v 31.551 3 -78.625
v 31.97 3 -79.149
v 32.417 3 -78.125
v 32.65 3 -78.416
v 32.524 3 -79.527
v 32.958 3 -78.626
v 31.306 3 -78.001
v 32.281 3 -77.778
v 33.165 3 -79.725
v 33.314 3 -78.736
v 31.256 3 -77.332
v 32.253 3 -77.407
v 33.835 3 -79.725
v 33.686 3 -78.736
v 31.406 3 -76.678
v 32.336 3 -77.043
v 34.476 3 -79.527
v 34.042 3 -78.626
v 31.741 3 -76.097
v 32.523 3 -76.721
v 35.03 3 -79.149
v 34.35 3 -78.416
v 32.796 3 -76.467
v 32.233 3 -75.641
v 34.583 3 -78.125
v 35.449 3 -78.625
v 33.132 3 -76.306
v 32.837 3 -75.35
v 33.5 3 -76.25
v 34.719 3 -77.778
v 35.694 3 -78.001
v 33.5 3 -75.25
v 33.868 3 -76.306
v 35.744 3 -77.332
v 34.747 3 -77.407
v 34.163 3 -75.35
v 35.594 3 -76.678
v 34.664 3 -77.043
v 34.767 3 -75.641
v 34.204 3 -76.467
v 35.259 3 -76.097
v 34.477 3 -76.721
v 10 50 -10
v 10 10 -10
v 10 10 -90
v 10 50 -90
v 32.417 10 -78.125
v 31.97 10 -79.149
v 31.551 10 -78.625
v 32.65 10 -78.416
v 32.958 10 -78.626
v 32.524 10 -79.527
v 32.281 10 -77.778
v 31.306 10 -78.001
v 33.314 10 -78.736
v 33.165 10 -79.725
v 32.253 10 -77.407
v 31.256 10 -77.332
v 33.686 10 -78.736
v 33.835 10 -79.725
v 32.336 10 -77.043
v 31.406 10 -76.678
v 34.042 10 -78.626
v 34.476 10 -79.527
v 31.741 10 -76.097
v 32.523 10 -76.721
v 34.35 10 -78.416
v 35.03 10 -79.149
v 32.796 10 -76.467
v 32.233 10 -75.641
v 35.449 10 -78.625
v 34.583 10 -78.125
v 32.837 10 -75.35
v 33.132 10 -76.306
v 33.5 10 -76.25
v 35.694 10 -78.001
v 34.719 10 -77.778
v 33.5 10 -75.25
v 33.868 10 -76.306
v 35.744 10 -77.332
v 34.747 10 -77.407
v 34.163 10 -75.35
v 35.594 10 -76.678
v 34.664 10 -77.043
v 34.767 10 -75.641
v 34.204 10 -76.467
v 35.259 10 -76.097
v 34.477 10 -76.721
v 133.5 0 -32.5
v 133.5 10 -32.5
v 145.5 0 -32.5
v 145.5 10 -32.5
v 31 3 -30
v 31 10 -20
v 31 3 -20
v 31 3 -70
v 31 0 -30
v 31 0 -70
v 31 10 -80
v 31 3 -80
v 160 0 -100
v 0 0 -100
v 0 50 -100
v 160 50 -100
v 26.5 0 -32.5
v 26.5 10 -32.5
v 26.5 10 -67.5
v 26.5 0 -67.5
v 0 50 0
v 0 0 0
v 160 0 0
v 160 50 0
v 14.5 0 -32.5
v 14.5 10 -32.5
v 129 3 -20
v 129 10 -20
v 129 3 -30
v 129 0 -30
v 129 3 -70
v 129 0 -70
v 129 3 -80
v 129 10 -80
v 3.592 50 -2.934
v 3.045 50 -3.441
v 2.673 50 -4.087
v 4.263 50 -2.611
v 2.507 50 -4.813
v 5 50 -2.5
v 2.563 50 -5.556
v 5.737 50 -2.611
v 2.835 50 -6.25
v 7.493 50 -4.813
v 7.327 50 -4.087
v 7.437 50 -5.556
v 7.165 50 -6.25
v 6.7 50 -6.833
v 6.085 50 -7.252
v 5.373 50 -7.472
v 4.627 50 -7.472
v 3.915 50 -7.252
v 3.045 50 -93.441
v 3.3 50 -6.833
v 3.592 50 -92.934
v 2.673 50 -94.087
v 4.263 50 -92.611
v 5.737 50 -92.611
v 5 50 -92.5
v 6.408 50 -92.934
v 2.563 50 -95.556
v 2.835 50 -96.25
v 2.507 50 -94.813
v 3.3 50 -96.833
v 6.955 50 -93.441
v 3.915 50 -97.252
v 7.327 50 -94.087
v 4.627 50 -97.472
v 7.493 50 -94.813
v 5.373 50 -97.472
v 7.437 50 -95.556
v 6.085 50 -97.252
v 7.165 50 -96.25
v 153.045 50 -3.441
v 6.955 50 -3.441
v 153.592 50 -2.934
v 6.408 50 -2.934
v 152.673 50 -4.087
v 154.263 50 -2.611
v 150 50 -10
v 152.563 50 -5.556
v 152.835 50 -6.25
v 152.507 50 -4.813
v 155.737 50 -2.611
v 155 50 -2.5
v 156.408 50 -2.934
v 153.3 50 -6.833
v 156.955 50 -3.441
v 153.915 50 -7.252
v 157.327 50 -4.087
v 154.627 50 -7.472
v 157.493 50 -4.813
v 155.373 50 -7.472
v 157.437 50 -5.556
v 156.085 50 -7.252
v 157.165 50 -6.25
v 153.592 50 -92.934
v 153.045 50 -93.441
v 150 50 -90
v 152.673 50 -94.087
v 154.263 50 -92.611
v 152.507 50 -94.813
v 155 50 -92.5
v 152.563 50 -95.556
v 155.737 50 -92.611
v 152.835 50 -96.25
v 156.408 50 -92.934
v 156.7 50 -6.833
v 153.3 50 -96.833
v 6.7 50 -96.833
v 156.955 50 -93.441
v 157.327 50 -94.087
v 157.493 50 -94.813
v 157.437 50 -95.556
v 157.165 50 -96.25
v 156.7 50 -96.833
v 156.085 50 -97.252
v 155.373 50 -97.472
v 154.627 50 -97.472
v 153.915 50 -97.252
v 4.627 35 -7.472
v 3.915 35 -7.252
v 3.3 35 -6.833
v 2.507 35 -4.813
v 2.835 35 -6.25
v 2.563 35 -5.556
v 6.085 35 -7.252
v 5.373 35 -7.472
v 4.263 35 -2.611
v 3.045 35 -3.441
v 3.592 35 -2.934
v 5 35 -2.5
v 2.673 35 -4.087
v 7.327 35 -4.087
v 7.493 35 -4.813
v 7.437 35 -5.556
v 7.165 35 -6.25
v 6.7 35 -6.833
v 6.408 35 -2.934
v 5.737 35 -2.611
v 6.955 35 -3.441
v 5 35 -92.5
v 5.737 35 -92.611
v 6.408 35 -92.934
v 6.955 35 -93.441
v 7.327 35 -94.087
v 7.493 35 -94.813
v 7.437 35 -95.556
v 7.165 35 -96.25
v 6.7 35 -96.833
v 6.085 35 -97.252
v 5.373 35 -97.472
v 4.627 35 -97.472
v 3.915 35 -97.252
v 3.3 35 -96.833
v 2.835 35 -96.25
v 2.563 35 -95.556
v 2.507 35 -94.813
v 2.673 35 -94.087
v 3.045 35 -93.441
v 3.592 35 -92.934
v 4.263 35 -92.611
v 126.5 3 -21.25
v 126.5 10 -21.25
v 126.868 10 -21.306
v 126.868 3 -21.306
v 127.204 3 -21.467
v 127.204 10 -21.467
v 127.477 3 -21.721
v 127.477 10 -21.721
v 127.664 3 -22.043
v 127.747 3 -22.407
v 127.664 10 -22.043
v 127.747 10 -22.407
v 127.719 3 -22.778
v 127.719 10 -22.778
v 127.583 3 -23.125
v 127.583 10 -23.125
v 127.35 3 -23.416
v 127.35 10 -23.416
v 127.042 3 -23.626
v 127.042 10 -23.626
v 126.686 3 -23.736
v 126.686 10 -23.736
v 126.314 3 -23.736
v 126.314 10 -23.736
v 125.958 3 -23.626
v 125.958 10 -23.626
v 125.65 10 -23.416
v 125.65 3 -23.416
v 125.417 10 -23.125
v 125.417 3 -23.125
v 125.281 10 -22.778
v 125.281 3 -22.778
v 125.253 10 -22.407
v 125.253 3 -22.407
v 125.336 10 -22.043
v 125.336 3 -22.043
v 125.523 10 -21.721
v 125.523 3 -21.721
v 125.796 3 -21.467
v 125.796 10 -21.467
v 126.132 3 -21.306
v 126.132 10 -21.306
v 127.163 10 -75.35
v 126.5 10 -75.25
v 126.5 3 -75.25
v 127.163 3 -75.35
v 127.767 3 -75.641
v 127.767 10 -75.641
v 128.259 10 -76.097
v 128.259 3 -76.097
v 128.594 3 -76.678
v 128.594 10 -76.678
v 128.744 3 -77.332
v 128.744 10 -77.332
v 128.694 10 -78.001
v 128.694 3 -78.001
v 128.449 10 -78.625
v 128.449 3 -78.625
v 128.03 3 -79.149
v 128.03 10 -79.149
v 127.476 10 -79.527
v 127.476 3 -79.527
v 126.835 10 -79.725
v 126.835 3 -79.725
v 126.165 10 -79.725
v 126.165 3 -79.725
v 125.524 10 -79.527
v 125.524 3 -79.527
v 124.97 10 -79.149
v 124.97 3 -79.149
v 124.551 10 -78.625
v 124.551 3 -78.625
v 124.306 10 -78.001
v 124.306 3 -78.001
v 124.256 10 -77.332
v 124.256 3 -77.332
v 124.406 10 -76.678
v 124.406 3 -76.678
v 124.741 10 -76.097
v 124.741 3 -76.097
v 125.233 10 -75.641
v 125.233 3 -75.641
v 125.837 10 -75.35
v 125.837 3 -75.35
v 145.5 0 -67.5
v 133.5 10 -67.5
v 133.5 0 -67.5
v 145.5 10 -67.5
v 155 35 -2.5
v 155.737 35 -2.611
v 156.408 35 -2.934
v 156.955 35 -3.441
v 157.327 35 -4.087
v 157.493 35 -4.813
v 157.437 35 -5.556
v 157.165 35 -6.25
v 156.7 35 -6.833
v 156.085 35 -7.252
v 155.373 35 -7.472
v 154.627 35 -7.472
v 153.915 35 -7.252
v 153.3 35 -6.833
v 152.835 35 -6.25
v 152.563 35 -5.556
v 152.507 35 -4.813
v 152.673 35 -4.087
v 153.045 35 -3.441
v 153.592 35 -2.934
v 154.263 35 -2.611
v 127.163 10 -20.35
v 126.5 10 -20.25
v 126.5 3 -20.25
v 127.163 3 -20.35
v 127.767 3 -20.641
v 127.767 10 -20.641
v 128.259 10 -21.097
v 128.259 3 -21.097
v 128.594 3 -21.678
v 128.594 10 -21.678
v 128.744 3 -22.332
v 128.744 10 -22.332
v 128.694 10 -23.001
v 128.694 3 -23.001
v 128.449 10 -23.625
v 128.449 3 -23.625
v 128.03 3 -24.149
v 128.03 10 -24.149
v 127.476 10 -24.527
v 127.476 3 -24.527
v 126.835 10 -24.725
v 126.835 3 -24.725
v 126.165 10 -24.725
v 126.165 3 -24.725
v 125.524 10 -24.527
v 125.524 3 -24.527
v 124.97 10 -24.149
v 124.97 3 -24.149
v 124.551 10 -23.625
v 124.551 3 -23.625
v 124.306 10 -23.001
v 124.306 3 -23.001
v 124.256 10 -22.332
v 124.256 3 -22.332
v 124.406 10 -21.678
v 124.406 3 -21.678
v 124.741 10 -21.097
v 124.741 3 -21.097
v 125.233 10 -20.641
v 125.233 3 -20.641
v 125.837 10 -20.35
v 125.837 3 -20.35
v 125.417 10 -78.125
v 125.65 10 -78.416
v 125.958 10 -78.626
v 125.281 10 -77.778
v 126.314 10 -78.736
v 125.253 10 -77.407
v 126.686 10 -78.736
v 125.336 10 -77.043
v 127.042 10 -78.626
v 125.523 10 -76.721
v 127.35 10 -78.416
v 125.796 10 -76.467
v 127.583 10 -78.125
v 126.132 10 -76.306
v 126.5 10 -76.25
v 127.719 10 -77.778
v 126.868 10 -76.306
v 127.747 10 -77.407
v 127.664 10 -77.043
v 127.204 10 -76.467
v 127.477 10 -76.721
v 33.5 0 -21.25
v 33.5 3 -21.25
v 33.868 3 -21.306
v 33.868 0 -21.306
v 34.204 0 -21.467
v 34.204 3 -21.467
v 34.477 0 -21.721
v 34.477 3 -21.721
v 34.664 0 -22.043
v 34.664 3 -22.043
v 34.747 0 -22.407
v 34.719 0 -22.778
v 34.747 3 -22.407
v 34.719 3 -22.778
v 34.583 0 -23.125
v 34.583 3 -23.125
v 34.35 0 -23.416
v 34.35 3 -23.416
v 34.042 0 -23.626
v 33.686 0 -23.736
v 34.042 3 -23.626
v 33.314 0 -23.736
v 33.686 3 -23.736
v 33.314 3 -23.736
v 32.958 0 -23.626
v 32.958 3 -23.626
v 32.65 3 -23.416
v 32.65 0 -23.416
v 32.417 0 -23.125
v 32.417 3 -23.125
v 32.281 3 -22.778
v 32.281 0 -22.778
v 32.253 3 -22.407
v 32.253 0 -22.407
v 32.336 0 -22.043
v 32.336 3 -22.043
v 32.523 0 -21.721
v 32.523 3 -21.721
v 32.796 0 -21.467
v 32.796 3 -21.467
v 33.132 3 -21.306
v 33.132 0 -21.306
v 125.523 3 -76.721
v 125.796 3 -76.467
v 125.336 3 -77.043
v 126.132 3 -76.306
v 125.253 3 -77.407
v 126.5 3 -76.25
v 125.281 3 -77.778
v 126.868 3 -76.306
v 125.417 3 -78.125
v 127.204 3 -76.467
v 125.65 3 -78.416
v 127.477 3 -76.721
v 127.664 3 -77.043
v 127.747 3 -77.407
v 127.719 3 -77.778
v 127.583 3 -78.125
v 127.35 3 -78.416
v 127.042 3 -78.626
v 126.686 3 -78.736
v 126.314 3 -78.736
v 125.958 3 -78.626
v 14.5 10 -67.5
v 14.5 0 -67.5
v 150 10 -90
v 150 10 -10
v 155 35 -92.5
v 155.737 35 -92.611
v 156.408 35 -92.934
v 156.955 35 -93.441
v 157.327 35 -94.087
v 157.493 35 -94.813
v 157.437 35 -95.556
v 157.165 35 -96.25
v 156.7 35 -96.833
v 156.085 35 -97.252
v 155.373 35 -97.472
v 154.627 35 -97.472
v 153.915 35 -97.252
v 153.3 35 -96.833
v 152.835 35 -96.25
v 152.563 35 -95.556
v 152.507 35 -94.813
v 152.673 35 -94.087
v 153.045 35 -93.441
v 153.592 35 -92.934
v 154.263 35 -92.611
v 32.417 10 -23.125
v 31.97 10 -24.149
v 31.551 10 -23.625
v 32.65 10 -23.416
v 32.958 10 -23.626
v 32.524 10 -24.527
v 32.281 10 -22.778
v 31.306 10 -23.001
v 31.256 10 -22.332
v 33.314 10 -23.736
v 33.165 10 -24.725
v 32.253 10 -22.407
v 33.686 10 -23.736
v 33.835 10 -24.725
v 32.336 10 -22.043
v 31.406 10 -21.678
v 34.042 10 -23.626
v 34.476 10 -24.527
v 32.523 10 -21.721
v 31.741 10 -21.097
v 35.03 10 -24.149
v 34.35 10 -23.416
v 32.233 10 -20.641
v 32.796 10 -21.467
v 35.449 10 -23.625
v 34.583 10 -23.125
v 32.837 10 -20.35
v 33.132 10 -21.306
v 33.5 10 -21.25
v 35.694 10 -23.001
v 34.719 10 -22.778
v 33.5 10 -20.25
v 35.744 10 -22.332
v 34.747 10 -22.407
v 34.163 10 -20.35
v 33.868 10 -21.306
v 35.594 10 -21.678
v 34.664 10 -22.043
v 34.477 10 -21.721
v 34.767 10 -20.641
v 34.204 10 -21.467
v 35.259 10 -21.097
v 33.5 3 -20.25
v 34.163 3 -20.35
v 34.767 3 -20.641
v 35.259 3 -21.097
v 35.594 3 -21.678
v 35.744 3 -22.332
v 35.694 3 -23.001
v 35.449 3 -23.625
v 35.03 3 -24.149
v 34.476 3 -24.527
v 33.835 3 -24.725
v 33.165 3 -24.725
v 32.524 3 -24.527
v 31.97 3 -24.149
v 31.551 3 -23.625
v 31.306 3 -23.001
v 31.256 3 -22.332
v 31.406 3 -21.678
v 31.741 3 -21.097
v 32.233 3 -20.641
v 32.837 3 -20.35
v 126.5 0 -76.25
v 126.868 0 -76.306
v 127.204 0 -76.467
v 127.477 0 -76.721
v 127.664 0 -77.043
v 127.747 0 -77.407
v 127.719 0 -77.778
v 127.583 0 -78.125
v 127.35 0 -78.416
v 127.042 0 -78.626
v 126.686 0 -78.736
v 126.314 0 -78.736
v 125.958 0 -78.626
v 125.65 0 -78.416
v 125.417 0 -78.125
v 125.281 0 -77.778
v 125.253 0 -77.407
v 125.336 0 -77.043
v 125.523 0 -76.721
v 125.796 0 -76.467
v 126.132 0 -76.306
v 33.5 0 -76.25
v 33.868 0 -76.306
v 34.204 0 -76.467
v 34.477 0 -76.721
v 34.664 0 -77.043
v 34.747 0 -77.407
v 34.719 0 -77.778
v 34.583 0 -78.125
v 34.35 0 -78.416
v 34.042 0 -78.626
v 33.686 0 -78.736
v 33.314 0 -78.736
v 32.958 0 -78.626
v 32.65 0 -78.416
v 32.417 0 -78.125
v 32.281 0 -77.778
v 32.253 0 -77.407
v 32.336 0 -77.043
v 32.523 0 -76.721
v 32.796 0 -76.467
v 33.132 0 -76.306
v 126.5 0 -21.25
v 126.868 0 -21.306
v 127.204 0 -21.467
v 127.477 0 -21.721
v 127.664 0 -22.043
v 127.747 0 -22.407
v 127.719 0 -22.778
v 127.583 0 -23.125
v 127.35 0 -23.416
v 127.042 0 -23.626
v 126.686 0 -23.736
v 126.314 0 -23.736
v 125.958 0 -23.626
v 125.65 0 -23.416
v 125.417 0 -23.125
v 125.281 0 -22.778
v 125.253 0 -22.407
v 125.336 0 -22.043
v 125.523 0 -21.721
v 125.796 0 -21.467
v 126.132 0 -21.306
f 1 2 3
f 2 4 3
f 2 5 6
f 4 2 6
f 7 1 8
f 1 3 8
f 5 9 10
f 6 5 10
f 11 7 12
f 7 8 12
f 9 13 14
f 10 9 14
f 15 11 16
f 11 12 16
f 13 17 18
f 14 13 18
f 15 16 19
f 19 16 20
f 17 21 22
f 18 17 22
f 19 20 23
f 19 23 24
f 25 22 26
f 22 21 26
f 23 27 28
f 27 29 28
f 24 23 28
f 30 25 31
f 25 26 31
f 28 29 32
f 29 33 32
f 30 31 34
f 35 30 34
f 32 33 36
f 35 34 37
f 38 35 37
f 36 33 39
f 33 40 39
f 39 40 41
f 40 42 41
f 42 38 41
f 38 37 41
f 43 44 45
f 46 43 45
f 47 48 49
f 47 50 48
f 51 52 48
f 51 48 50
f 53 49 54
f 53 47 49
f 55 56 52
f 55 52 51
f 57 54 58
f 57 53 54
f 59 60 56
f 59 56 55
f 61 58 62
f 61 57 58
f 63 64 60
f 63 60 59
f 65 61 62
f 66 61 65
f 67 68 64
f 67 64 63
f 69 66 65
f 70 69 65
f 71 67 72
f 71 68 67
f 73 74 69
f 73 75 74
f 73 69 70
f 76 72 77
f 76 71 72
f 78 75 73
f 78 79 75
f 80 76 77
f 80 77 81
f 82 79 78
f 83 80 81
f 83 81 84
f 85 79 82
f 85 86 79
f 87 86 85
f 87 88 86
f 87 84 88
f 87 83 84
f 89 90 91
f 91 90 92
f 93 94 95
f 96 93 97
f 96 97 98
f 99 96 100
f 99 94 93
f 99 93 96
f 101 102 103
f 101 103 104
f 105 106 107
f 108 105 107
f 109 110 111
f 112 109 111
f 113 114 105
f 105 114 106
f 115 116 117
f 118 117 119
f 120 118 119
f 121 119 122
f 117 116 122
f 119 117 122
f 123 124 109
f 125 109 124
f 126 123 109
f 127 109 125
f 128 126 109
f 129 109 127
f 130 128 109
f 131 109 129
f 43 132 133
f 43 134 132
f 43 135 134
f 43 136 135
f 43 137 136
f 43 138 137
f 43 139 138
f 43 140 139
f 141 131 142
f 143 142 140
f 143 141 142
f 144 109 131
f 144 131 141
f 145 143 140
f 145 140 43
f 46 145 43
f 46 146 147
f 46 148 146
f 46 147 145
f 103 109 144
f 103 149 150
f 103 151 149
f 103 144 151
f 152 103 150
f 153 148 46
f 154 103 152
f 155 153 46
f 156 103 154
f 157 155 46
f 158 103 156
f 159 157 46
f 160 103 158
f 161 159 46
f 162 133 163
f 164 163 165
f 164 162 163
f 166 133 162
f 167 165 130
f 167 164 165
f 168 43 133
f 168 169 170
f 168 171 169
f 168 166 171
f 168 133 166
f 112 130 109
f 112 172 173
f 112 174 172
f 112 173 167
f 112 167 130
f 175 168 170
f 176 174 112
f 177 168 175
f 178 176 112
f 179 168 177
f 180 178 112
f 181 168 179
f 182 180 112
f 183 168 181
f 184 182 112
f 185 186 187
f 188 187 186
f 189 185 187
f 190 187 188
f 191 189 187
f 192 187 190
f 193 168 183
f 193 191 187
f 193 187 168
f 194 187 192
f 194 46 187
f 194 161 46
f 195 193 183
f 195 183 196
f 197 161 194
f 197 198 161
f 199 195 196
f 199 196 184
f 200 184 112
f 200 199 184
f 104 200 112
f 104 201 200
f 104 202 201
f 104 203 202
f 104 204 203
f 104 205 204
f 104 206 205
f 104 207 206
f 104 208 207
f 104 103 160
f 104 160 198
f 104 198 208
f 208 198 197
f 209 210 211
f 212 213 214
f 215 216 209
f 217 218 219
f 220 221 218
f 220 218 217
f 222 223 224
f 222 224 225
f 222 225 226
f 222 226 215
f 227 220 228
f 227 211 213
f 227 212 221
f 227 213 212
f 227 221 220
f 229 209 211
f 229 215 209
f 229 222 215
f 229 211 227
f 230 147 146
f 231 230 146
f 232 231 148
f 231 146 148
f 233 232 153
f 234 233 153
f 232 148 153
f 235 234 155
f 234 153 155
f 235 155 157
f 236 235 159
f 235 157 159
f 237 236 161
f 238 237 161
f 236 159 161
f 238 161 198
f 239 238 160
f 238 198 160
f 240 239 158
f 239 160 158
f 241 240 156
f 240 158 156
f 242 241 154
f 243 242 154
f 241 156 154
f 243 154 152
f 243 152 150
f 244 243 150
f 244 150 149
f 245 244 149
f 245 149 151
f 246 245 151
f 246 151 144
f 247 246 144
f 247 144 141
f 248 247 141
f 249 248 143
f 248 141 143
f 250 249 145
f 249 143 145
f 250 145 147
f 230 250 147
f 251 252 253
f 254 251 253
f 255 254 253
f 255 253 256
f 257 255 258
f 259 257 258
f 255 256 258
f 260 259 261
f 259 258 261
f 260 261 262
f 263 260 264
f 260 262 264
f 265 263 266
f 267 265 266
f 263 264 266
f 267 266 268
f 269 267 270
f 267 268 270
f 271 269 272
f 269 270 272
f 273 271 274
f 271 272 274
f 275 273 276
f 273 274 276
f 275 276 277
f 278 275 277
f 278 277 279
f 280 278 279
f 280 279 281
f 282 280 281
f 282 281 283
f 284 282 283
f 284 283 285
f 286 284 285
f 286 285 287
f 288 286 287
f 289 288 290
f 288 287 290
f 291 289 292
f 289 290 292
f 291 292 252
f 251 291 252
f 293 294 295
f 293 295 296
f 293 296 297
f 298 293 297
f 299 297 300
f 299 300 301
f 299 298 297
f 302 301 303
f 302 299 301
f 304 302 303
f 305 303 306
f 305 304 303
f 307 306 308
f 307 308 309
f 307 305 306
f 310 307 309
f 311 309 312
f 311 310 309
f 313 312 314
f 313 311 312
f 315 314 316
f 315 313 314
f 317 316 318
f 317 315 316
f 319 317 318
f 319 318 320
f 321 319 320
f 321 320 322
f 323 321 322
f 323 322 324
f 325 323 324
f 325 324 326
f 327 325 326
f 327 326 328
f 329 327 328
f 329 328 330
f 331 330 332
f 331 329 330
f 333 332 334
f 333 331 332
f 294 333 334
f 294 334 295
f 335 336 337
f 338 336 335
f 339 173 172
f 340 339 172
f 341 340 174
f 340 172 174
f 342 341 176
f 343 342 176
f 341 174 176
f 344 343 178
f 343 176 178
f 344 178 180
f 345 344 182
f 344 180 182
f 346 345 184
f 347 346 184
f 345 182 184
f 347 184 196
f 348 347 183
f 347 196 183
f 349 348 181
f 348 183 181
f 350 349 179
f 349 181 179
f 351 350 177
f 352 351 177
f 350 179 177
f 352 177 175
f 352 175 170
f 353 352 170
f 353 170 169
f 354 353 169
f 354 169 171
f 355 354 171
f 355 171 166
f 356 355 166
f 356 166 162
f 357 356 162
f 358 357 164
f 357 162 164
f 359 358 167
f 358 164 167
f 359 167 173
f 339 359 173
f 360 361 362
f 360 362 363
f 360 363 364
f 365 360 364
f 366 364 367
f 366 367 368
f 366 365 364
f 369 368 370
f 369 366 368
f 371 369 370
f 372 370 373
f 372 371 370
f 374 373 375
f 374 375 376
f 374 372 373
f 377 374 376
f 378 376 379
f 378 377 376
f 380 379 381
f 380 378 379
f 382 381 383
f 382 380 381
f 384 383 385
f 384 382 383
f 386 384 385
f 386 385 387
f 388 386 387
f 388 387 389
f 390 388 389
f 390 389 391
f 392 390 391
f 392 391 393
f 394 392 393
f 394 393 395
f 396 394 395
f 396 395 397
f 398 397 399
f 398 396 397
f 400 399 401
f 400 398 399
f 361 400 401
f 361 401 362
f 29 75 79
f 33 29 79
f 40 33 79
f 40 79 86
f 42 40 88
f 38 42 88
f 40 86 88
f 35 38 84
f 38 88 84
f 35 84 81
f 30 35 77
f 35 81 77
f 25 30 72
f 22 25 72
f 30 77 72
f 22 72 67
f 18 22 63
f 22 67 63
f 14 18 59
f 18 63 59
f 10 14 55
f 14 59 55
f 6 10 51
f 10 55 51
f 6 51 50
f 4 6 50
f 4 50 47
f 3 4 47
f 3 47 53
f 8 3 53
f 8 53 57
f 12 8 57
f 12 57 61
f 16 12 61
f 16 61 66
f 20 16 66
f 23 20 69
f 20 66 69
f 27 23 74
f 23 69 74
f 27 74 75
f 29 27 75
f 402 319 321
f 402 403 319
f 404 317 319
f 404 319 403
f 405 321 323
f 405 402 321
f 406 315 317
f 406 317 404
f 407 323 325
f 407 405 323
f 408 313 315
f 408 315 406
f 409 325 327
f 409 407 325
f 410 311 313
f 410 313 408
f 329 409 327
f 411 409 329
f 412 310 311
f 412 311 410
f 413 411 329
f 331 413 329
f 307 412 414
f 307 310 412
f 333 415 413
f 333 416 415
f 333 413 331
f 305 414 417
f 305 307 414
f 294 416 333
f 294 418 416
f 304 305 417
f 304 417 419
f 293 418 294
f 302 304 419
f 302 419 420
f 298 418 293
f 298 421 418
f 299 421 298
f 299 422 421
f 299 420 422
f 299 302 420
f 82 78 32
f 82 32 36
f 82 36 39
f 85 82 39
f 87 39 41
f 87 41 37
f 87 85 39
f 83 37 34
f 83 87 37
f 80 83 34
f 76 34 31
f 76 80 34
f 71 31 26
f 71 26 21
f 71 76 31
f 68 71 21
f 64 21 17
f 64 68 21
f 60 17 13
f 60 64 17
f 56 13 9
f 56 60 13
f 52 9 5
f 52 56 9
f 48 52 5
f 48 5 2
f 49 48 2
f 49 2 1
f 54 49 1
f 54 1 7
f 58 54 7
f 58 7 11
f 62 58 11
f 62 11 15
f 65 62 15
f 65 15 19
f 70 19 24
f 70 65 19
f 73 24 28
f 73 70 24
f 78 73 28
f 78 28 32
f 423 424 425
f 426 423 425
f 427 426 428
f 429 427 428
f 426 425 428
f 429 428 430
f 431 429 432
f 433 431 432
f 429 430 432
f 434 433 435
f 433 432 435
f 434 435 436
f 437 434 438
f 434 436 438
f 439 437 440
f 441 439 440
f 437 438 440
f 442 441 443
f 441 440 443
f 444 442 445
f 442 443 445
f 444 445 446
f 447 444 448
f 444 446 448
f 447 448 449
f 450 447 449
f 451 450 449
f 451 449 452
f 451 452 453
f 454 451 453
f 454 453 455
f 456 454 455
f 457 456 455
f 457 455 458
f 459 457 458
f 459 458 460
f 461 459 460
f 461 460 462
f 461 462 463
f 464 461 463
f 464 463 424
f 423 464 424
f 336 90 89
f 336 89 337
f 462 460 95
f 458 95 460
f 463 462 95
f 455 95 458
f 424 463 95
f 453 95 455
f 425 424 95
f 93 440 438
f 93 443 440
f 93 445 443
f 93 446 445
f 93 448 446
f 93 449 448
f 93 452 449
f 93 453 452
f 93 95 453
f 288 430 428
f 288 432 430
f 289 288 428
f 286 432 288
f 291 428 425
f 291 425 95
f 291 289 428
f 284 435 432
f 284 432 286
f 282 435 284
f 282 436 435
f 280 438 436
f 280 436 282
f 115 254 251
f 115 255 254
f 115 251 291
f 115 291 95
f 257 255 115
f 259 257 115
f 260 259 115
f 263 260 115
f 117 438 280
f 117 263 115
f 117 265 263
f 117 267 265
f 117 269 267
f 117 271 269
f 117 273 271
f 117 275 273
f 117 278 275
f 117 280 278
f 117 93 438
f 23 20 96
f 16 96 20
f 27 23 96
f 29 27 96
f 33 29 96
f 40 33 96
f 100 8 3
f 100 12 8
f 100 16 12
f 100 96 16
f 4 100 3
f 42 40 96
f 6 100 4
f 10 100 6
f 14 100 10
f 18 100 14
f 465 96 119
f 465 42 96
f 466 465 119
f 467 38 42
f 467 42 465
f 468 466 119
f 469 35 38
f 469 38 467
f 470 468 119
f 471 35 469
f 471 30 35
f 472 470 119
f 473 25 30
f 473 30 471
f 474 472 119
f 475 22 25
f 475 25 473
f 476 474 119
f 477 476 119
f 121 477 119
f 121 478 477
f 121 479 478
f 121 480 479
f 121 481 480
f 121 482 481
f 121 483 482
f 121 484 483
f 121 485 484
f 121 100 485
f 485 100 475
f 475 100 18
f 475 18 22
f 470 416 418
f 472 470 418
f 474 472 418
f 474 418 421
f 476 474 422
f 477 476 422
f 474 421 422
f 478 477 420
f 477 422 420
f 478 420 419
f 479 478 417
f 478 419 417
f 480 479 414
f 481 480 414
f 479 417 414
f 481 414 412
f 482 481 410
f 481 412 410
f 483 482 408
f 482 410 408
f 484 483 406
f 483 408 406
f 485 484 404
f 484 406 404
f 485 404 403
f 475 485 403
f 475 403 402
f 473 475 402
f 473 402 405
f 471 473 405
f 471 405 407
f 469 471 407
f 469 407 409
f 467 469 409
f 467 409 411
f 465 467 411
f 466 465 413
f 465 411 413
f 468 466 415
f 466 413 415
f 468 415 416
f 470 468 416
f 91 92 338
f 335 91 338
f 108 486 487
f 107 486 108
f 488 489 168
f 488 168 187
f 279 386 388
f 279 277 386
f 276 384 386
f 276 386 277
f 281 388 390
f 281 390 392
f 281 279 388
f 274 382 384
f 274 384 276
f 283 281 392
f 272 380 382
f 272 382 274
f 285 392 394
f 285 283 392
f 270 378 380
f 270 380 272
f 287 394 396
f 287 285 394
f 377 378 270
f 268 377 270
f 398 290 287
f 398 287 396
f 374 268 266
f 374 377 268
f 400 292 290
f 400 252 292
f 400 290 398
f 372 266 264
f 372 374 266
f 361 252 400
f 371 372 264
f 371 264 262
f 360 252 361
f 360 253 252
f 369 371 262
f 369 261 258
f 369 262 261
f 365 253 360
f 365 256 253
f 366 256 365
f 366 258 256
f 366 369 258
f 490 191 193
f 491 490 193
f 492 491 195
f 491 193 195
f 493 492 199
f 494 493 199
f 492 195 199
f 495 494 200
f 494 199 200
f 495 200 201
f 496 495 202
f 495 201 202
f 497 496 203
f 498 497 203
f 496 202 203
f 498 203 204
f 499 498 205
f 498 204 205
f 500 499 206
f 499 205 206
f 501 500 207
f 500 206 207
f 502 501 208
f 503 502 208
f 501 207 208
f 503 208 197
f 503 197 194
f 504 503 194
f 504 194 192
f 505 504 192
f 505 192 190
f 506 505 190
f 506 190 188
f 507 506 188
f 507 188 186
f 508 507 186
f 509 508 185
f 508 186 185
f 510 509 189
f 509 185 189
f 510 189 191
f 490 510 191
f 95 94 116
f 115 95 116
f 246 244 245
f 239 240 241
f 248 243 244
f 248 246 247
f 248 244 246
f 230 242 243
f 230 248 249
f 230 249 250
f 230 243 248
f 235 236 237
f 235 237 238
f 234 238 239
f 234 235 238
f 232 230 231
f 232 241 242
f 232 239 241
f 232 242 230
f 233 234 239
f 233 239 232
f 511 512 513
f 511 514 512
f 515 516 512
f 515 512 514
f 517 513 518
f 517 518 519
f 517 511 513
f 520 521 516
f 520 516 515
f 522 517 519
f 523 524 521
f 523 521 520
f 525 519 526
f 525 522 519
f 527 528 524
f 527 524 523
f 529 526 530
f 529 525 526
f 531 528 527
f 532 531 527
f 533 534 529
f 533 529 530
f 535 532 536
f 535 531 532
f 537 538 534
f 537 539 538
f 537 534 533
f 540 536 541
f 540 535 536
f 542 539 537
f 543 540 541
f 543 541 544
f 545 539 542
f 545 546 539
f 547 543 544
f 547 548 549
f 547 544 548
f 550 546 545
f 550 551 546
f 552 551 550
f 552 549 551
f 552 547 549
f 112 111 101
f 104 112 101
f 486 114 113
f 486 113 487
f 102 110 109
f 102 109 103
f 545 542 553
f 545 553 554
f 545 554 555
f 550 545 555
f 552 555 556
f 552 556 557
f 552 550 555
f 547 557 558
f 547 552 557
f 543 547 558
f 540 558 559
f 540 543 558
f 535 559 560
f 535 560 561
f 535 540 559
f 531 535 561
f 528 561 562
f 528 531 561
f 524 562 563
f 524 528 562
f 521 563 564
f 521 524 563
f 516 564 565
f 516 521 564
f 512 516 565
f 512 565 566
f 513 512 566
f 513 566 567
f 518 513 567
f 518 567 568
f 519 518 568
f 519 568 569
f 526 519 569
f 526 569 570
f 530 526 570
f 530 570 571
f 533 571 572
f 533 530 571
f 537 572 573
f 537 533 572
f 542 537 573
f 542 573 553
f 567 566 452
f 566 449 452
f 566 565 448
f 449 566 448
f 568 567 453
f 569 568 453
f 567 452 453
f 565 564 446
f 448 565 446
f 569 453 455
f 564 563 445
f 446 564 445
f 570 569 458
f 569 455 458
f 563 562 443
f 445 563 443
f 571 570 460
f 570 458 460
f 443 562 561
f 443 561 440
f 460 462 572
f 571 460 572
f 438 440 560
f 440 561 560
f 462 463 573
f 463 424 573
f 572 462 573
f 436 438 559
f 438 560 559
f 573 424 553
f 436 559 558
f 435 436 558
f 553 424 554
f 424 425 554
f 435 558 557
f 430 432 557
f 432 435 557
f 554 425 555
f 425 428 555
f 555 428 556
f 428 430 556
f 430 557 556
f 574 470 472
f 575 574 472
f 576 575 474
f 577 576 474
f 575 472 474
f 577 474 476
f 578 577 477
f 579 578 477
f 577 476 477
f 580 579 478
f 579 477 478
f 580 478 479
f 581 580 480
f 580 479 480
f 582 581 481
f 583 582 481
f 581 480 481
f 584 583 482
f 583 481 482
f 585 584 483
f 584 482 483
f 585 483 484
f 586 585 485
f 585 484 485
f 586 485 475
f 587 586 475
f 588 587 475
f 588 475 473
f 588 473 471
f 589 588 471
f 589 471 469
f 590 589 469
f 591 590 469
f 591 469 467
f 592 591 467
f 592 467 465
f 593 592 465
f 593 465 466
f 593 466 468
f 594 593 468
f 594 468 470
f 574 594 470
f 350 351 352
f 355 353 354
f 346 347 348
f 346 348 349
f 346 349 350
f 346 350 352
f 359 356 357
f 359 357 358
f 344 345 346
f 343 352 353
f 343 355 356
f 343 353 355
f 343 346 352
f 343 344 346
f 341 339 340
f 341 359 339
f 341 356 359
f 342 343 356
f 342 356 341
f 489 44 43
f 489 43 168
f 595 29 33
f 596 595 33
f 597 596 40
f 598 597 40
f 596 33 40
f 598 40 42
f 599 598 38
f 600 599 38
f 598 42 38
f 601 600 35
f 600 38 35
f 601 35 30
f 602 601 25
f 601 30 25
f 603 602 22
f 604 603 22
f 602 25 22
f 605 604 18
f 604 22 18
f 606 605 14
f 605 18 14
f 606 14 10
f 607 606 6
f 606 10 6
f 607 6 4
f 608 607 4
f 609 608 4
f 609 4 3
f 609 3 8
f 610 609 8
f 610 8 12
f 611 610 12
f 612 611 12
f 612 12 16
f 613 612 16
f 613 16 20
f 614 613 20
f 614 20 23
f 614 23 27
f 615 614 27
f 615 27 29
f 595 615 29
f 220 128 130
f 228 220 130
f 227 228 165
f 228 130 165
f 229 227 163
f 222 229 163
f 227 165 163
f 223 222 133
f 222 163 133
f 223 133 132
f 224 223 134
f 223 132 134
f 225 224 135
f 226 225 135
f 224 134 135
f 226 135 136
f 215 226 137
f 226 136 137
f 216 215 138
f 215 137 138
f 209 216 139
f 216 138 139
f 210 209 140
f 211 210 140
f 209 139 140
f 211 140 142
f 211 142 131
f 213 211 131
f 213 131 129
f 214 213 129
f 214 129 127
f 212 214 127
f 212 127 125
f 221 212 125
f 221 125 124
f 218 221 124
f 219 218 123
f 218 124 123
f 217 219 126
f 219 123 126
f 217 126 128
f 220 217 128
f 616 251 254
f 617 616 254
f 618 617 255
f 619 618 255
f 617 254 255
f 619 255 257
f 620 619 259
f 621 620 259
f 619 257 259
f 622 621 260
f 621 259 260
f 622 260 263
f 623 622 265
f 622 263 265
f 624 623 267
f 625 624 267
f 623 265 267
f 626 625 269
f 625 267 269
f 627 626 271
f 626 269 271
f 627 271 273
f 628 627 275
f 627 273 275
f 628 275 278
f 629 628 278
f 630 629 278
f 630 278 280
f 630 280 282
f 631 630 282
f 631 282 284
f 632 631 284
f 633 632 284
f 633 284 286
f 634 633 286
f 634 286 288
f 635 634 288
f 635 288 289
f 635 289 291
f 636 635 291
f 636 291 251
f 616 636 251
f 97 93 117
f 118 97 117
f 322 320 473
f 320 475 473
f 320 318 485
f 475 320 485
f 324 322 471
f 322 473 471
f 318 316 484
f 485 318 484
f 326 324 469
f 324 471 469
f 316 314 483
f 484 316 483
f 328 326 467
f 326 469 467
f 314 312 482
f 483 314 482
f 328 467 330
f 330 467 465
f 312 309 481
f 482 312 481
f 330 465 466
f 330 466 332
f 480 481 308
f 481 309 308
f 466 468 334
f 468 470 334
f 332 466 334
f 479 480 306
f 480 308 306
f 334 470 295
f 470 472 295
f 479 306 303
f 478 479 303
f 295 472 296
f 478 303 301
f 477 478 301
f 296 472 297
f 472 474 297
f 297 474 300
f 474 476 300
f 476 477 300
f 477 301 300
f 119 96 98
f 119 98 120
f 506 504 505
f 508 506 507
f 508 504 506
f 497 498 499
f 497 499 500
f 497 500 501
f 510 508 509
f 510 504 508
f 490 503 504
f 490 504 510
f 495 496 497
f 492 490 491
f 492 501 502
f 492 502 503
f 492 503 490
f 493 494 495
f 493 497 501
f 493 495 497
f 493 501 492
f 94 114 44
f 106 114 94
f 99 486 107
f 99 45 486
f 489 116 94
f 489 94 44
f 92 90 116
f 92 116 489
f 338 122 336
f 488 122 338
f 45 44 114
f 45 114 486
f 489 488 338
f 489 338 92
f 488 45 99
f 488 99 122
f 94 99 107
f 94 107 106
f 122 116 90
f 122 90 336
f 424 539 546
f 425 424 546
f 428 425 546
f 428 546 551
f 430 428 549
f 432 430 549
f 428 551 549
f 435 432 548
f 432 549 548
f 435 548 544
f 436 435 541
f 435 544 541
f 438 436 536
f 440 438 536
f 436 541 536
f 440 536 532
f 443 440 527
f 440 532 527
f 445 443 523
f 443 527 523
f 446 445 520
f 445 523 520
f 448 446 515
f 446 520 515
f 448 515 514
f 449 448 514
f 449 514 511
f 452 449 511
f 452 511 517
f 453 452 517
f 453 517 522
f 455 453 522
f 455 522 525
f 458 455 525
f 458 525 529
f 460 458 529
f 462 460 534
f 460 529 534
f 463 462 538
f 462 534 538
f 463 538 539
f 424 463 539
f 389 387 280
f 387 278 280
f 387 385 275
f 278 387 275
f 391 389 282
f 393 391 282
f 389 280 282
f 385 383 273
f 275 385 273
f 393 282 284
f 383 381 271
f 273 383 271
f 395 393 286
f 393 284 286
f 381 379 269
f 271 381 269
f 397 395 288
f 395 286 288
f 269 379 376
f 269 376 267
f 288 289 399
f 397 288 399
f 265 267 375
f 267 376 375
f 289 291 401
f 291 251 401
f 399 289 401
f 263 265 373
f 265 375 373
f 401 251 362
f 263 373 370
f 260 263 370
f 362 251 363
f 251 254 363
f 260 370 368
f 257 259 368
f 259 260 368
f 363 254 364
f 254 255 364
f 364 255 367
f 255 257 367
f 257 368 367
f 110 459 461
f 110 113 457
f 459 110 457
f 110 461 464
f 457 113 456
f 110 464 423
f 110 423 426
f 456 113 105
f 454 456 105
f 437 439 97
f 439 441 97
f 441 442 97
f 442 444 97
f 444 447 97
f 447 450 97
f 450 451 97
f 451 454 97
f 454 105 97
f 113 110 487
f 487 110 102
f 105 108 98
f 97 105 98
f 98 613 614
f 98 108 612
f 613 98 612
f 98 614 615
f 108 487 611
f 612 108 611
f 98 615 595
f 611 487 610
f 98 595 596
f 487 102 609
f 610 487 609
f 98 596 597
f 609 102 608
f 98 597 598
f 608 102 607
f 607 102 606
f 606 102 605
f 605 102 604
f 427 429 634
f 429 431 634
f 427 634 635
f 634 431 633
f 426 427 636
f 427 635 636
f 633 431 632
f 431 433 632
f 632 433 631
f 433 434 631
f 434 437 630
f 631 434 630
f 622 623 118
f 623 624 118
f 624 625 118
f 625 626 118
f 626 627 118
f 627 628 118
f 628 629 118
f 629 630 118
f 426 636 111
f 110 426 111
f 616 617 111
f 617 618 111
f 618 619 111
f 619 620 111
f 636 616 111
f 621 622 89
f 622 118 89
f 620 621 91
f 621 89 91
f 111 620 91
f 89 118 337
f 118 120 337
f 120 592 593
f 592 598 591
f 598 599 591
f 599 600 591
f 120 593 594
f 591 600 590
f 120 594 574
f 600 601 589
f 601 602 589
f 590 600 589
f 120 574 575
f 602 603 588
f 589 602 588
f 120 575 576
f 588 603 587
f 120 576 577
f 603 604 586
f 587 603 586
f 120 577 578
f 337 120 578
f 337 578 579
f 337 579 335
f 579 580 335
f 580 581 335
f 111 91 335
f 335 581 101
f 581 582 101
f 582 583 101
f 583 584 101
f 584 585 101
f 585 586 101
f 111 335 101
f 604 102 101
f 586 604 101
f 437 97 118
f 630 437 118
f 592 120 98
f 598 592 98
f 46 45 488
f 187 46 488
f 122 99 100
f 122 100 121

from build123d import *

# Parameters (mm, degrees)
ESQUISSE1_W             = 160
ESQUISSE1_H             = 100
BOSS_EXTRU_1_DEPTH      = 50
COQUE1_T                = -10
ESQUISSE2_R             = 2.5
ENL_V_MAT_EXTRU_2_DEPTH = 15
ESQUISSE3_W             = 98
ESQUISSE3_H             = 40
ENL_V_MAT_EXTRU_3_DEPTH = 10
ESQUISSE3_3_R           = 1.25
ENL_V_MAT_EXTRU_4_DEPTH = 10
ESQUISSE3_5_W           = 98
ESQUISSE3_5_H           = 60
ENL_V_MAT_EXTRU_5_DEPTH = 7
ESQUISSE3_6_R           = 2.25
ESQUISSE3_6_R_2         = 1.25
BOSS_EXTRU_2_DEPTH      = 7
BOSS_EXTRU_2_2_DEPTH    = 7
BOSS_EXTRU_2_3_DEPTH    = 7
BOSS_EXTRU_2_4_DEPTH    = 7
ESQUISSE4_W             = 12
ESQUISSE4_H             = 35
ENL_V_MAT_EXTRU_6_DEPTH = 10


with BuildPart() as part:
    # Esquisse1 → Boss.-Extru.1 (new body)
    with BuildSketch(Plane(origin=(0, 0, 0), x_dir=(1, 0, 0), z_dir=(0, 1, 0))):
        with Locations((80, 50)):
            Rectangle(ESQUISSE1_W, ESQUISSE1_H)
    extrude(amount=BOSS_EXTRU_1_DEPTH)

    # Coque1
    coque1_openings = [part.faces().sort_by_distance(p)[0] for p in [
        (80, 50, -50),
    ]]
    offset(amount=COQUE1_T, openings=coque1_openings, kind=Kind.INTERSECTION)

    # Esquisse2 → Enlèv. mat.-Extru.2 (cut)
    with BuildSketch(Plane(origin=(0, 50, 0), x_dir=(1, 0, 0), z_dir=(0, 1, 0))):
        with Locations((155, 95)):
            Circle(ESQUISSE2_R)
        with Locations((155, 5)):
            Circle(ESQUISSE2_R)
        with Locations((5, 5)):
            Circle(ESQUISSE2_R)
        with Locations((5, 95)):
            Circle(ESQUISSE2_R)
    extrude(amount=-ENL_V_MAT_EXTRU_2_DEPTH, mode=Mode.SUBTRACT)

    # Esquisse3 → Enlèv. mat.-Extru.3 (cut)
    with BuildSketch(Plane(origin=(0, 10, 0), x_dir=(1, 0, 0), z_dir=(0, 1, 0))):
        with Locations((80, 50)):
            Rectangle(ESQUISSE3_W, ESQUISSE3_H)
    extrude(amount=-ENL_V_MAT_EXTRU_3_DEPTH, mode=Mode.SUBTRACT)

    # Esquisse3<3> → Enlèv. mat.-Extru.4 (cut)
    with BuildSketch(Plane(origin=(0, 10, 0), x_dir=(1, 0, 0), z_dir=(0, 1, 0))):
        with Locations((33.5, 77.5)):
            Circle(ESQUISSE3_3_R)
        with Locations((33.5, 22.5)):
            Circle(ESQUISSE3_3_R)
        with Locations((126.5, 77.5)):
            Circle(ESQUISSE3_3_R)
        with Locations((126.5, 22.5)):
            Circle(ESQUISSE3_3_R)
    extrude(amount=-ENL_V_MAT_EXTRU_4_DEPTH, mode=Mode.SUBTRACT)

    # Esquisse3<5> → Enlèv. mat.-Extru.5 (cut)
    with BuildSketch(Plane(origin=(0, 10, 0), x_dir=(1, 0, 0), z_dir=(0, 1, 0))):
        with Locations((80, 50)):
            Rectangle(ESQUISSE3_5_W, ESQUISSE3_5_H)
    extrude(amount=-ENL_V_MAT_EXTRU_5_DEPTH, mode=Mode.SUBTRACT)

    # Esquisse4 → Enlèv. mat.-Extru.6 (cut)
    with BuildSketch(Plane(origin=(0, 10, 0), x_dir=(1, 0, 0), z_dir=(0, 1, 0))):
        with Locations((20.5, 50)):
            Rectangle(ESQUISSE4_W, ESQUISSE4_H)
        with Locations((139.5, 50)):
            Rectangle(ESQUISSE4_W, ESQUISSE4_H)
    extrude(amount=-ENL_V_MAT_EXTRU_6_DEPTH, mode=Mode.SUBTRACT)


with BuildPart() as body_2:
    # Esquisse3<6> → Boss.-Extru.2 (new body)
    with BuildSketch(Plane(origin=(0, 10, 0), x_dir=(1, 0, 0), z_dir=(0, 1, 0))):
        with Locations((33.5, 77.5)):
            Circle(ESQUISSE3_6_R)
        with Locations((33.5, 77.5)):
            Circle(ESQUISSE3_6_R_2, mode=Mode.SUBTRACT)
    extrude(amount=-BOSS_EXTRU_2_DEPTH)


with BuildPart() as body_3:
    # Esquisse3<6> → Boss.-Extru.2 2 (new body)
    with BuildSketch(Plane(origin=(0, 10, 0), x_dir=(1, 0, 0), z_dir=(0, 1, 0))):
        with Locations((126.5, 77.5)):
            Circle(ESQUISSE3_6_R)
        with Locations((126.5, 77.5)):
            Circle(ESQUISSE3_6_R_2, mode=Mode.SUBTRACT)
    extrude(amount=-BOSS_EXTRU_2_2_DEPTH)


with BuildPart() as body_4:
    # Esquisse3<6> → Boss.-Extru.2 3 (new body)
    with BuildSketch(Plane(origin=(0, 10, 0), x_dir=(1, 0, 0), z_dir=(0, 1, 0))):
        with Locations((126.5, 22.5)):
            Circle(ESQUISSE3_6_R)
        with Locations((126.5, 22.5)):
            Circle(ESQUISSE3_6_R_2, mode=Mode.SUBTRACT)
    extrude(amount=-BOSS_EXTRU_2_3_DEPTH)


with BuildPart() as body_5:
    # Esquisse3<6> → Boss.-Extru.2 4 (new body)
    with BuildSketch(Plane(origin=(0, 10, 0), x_dir=(1, 0, 0), z_dir=(0, 1, 0))):
        with Locations((33.5, 22.5)):
            Circle(ESQUISSE3_6_R)
        with Locations((33.5, 22.5)):
            Circle(ESQUISSE3_6_R_2, mode=Mode.SUBTRACT)
    extrude(amount=-BOSS_EXTRU_2_4_DEPTH)


solid = Compound([part.part, body_2.part, body_3.part, body_4.part, body_5.part])
